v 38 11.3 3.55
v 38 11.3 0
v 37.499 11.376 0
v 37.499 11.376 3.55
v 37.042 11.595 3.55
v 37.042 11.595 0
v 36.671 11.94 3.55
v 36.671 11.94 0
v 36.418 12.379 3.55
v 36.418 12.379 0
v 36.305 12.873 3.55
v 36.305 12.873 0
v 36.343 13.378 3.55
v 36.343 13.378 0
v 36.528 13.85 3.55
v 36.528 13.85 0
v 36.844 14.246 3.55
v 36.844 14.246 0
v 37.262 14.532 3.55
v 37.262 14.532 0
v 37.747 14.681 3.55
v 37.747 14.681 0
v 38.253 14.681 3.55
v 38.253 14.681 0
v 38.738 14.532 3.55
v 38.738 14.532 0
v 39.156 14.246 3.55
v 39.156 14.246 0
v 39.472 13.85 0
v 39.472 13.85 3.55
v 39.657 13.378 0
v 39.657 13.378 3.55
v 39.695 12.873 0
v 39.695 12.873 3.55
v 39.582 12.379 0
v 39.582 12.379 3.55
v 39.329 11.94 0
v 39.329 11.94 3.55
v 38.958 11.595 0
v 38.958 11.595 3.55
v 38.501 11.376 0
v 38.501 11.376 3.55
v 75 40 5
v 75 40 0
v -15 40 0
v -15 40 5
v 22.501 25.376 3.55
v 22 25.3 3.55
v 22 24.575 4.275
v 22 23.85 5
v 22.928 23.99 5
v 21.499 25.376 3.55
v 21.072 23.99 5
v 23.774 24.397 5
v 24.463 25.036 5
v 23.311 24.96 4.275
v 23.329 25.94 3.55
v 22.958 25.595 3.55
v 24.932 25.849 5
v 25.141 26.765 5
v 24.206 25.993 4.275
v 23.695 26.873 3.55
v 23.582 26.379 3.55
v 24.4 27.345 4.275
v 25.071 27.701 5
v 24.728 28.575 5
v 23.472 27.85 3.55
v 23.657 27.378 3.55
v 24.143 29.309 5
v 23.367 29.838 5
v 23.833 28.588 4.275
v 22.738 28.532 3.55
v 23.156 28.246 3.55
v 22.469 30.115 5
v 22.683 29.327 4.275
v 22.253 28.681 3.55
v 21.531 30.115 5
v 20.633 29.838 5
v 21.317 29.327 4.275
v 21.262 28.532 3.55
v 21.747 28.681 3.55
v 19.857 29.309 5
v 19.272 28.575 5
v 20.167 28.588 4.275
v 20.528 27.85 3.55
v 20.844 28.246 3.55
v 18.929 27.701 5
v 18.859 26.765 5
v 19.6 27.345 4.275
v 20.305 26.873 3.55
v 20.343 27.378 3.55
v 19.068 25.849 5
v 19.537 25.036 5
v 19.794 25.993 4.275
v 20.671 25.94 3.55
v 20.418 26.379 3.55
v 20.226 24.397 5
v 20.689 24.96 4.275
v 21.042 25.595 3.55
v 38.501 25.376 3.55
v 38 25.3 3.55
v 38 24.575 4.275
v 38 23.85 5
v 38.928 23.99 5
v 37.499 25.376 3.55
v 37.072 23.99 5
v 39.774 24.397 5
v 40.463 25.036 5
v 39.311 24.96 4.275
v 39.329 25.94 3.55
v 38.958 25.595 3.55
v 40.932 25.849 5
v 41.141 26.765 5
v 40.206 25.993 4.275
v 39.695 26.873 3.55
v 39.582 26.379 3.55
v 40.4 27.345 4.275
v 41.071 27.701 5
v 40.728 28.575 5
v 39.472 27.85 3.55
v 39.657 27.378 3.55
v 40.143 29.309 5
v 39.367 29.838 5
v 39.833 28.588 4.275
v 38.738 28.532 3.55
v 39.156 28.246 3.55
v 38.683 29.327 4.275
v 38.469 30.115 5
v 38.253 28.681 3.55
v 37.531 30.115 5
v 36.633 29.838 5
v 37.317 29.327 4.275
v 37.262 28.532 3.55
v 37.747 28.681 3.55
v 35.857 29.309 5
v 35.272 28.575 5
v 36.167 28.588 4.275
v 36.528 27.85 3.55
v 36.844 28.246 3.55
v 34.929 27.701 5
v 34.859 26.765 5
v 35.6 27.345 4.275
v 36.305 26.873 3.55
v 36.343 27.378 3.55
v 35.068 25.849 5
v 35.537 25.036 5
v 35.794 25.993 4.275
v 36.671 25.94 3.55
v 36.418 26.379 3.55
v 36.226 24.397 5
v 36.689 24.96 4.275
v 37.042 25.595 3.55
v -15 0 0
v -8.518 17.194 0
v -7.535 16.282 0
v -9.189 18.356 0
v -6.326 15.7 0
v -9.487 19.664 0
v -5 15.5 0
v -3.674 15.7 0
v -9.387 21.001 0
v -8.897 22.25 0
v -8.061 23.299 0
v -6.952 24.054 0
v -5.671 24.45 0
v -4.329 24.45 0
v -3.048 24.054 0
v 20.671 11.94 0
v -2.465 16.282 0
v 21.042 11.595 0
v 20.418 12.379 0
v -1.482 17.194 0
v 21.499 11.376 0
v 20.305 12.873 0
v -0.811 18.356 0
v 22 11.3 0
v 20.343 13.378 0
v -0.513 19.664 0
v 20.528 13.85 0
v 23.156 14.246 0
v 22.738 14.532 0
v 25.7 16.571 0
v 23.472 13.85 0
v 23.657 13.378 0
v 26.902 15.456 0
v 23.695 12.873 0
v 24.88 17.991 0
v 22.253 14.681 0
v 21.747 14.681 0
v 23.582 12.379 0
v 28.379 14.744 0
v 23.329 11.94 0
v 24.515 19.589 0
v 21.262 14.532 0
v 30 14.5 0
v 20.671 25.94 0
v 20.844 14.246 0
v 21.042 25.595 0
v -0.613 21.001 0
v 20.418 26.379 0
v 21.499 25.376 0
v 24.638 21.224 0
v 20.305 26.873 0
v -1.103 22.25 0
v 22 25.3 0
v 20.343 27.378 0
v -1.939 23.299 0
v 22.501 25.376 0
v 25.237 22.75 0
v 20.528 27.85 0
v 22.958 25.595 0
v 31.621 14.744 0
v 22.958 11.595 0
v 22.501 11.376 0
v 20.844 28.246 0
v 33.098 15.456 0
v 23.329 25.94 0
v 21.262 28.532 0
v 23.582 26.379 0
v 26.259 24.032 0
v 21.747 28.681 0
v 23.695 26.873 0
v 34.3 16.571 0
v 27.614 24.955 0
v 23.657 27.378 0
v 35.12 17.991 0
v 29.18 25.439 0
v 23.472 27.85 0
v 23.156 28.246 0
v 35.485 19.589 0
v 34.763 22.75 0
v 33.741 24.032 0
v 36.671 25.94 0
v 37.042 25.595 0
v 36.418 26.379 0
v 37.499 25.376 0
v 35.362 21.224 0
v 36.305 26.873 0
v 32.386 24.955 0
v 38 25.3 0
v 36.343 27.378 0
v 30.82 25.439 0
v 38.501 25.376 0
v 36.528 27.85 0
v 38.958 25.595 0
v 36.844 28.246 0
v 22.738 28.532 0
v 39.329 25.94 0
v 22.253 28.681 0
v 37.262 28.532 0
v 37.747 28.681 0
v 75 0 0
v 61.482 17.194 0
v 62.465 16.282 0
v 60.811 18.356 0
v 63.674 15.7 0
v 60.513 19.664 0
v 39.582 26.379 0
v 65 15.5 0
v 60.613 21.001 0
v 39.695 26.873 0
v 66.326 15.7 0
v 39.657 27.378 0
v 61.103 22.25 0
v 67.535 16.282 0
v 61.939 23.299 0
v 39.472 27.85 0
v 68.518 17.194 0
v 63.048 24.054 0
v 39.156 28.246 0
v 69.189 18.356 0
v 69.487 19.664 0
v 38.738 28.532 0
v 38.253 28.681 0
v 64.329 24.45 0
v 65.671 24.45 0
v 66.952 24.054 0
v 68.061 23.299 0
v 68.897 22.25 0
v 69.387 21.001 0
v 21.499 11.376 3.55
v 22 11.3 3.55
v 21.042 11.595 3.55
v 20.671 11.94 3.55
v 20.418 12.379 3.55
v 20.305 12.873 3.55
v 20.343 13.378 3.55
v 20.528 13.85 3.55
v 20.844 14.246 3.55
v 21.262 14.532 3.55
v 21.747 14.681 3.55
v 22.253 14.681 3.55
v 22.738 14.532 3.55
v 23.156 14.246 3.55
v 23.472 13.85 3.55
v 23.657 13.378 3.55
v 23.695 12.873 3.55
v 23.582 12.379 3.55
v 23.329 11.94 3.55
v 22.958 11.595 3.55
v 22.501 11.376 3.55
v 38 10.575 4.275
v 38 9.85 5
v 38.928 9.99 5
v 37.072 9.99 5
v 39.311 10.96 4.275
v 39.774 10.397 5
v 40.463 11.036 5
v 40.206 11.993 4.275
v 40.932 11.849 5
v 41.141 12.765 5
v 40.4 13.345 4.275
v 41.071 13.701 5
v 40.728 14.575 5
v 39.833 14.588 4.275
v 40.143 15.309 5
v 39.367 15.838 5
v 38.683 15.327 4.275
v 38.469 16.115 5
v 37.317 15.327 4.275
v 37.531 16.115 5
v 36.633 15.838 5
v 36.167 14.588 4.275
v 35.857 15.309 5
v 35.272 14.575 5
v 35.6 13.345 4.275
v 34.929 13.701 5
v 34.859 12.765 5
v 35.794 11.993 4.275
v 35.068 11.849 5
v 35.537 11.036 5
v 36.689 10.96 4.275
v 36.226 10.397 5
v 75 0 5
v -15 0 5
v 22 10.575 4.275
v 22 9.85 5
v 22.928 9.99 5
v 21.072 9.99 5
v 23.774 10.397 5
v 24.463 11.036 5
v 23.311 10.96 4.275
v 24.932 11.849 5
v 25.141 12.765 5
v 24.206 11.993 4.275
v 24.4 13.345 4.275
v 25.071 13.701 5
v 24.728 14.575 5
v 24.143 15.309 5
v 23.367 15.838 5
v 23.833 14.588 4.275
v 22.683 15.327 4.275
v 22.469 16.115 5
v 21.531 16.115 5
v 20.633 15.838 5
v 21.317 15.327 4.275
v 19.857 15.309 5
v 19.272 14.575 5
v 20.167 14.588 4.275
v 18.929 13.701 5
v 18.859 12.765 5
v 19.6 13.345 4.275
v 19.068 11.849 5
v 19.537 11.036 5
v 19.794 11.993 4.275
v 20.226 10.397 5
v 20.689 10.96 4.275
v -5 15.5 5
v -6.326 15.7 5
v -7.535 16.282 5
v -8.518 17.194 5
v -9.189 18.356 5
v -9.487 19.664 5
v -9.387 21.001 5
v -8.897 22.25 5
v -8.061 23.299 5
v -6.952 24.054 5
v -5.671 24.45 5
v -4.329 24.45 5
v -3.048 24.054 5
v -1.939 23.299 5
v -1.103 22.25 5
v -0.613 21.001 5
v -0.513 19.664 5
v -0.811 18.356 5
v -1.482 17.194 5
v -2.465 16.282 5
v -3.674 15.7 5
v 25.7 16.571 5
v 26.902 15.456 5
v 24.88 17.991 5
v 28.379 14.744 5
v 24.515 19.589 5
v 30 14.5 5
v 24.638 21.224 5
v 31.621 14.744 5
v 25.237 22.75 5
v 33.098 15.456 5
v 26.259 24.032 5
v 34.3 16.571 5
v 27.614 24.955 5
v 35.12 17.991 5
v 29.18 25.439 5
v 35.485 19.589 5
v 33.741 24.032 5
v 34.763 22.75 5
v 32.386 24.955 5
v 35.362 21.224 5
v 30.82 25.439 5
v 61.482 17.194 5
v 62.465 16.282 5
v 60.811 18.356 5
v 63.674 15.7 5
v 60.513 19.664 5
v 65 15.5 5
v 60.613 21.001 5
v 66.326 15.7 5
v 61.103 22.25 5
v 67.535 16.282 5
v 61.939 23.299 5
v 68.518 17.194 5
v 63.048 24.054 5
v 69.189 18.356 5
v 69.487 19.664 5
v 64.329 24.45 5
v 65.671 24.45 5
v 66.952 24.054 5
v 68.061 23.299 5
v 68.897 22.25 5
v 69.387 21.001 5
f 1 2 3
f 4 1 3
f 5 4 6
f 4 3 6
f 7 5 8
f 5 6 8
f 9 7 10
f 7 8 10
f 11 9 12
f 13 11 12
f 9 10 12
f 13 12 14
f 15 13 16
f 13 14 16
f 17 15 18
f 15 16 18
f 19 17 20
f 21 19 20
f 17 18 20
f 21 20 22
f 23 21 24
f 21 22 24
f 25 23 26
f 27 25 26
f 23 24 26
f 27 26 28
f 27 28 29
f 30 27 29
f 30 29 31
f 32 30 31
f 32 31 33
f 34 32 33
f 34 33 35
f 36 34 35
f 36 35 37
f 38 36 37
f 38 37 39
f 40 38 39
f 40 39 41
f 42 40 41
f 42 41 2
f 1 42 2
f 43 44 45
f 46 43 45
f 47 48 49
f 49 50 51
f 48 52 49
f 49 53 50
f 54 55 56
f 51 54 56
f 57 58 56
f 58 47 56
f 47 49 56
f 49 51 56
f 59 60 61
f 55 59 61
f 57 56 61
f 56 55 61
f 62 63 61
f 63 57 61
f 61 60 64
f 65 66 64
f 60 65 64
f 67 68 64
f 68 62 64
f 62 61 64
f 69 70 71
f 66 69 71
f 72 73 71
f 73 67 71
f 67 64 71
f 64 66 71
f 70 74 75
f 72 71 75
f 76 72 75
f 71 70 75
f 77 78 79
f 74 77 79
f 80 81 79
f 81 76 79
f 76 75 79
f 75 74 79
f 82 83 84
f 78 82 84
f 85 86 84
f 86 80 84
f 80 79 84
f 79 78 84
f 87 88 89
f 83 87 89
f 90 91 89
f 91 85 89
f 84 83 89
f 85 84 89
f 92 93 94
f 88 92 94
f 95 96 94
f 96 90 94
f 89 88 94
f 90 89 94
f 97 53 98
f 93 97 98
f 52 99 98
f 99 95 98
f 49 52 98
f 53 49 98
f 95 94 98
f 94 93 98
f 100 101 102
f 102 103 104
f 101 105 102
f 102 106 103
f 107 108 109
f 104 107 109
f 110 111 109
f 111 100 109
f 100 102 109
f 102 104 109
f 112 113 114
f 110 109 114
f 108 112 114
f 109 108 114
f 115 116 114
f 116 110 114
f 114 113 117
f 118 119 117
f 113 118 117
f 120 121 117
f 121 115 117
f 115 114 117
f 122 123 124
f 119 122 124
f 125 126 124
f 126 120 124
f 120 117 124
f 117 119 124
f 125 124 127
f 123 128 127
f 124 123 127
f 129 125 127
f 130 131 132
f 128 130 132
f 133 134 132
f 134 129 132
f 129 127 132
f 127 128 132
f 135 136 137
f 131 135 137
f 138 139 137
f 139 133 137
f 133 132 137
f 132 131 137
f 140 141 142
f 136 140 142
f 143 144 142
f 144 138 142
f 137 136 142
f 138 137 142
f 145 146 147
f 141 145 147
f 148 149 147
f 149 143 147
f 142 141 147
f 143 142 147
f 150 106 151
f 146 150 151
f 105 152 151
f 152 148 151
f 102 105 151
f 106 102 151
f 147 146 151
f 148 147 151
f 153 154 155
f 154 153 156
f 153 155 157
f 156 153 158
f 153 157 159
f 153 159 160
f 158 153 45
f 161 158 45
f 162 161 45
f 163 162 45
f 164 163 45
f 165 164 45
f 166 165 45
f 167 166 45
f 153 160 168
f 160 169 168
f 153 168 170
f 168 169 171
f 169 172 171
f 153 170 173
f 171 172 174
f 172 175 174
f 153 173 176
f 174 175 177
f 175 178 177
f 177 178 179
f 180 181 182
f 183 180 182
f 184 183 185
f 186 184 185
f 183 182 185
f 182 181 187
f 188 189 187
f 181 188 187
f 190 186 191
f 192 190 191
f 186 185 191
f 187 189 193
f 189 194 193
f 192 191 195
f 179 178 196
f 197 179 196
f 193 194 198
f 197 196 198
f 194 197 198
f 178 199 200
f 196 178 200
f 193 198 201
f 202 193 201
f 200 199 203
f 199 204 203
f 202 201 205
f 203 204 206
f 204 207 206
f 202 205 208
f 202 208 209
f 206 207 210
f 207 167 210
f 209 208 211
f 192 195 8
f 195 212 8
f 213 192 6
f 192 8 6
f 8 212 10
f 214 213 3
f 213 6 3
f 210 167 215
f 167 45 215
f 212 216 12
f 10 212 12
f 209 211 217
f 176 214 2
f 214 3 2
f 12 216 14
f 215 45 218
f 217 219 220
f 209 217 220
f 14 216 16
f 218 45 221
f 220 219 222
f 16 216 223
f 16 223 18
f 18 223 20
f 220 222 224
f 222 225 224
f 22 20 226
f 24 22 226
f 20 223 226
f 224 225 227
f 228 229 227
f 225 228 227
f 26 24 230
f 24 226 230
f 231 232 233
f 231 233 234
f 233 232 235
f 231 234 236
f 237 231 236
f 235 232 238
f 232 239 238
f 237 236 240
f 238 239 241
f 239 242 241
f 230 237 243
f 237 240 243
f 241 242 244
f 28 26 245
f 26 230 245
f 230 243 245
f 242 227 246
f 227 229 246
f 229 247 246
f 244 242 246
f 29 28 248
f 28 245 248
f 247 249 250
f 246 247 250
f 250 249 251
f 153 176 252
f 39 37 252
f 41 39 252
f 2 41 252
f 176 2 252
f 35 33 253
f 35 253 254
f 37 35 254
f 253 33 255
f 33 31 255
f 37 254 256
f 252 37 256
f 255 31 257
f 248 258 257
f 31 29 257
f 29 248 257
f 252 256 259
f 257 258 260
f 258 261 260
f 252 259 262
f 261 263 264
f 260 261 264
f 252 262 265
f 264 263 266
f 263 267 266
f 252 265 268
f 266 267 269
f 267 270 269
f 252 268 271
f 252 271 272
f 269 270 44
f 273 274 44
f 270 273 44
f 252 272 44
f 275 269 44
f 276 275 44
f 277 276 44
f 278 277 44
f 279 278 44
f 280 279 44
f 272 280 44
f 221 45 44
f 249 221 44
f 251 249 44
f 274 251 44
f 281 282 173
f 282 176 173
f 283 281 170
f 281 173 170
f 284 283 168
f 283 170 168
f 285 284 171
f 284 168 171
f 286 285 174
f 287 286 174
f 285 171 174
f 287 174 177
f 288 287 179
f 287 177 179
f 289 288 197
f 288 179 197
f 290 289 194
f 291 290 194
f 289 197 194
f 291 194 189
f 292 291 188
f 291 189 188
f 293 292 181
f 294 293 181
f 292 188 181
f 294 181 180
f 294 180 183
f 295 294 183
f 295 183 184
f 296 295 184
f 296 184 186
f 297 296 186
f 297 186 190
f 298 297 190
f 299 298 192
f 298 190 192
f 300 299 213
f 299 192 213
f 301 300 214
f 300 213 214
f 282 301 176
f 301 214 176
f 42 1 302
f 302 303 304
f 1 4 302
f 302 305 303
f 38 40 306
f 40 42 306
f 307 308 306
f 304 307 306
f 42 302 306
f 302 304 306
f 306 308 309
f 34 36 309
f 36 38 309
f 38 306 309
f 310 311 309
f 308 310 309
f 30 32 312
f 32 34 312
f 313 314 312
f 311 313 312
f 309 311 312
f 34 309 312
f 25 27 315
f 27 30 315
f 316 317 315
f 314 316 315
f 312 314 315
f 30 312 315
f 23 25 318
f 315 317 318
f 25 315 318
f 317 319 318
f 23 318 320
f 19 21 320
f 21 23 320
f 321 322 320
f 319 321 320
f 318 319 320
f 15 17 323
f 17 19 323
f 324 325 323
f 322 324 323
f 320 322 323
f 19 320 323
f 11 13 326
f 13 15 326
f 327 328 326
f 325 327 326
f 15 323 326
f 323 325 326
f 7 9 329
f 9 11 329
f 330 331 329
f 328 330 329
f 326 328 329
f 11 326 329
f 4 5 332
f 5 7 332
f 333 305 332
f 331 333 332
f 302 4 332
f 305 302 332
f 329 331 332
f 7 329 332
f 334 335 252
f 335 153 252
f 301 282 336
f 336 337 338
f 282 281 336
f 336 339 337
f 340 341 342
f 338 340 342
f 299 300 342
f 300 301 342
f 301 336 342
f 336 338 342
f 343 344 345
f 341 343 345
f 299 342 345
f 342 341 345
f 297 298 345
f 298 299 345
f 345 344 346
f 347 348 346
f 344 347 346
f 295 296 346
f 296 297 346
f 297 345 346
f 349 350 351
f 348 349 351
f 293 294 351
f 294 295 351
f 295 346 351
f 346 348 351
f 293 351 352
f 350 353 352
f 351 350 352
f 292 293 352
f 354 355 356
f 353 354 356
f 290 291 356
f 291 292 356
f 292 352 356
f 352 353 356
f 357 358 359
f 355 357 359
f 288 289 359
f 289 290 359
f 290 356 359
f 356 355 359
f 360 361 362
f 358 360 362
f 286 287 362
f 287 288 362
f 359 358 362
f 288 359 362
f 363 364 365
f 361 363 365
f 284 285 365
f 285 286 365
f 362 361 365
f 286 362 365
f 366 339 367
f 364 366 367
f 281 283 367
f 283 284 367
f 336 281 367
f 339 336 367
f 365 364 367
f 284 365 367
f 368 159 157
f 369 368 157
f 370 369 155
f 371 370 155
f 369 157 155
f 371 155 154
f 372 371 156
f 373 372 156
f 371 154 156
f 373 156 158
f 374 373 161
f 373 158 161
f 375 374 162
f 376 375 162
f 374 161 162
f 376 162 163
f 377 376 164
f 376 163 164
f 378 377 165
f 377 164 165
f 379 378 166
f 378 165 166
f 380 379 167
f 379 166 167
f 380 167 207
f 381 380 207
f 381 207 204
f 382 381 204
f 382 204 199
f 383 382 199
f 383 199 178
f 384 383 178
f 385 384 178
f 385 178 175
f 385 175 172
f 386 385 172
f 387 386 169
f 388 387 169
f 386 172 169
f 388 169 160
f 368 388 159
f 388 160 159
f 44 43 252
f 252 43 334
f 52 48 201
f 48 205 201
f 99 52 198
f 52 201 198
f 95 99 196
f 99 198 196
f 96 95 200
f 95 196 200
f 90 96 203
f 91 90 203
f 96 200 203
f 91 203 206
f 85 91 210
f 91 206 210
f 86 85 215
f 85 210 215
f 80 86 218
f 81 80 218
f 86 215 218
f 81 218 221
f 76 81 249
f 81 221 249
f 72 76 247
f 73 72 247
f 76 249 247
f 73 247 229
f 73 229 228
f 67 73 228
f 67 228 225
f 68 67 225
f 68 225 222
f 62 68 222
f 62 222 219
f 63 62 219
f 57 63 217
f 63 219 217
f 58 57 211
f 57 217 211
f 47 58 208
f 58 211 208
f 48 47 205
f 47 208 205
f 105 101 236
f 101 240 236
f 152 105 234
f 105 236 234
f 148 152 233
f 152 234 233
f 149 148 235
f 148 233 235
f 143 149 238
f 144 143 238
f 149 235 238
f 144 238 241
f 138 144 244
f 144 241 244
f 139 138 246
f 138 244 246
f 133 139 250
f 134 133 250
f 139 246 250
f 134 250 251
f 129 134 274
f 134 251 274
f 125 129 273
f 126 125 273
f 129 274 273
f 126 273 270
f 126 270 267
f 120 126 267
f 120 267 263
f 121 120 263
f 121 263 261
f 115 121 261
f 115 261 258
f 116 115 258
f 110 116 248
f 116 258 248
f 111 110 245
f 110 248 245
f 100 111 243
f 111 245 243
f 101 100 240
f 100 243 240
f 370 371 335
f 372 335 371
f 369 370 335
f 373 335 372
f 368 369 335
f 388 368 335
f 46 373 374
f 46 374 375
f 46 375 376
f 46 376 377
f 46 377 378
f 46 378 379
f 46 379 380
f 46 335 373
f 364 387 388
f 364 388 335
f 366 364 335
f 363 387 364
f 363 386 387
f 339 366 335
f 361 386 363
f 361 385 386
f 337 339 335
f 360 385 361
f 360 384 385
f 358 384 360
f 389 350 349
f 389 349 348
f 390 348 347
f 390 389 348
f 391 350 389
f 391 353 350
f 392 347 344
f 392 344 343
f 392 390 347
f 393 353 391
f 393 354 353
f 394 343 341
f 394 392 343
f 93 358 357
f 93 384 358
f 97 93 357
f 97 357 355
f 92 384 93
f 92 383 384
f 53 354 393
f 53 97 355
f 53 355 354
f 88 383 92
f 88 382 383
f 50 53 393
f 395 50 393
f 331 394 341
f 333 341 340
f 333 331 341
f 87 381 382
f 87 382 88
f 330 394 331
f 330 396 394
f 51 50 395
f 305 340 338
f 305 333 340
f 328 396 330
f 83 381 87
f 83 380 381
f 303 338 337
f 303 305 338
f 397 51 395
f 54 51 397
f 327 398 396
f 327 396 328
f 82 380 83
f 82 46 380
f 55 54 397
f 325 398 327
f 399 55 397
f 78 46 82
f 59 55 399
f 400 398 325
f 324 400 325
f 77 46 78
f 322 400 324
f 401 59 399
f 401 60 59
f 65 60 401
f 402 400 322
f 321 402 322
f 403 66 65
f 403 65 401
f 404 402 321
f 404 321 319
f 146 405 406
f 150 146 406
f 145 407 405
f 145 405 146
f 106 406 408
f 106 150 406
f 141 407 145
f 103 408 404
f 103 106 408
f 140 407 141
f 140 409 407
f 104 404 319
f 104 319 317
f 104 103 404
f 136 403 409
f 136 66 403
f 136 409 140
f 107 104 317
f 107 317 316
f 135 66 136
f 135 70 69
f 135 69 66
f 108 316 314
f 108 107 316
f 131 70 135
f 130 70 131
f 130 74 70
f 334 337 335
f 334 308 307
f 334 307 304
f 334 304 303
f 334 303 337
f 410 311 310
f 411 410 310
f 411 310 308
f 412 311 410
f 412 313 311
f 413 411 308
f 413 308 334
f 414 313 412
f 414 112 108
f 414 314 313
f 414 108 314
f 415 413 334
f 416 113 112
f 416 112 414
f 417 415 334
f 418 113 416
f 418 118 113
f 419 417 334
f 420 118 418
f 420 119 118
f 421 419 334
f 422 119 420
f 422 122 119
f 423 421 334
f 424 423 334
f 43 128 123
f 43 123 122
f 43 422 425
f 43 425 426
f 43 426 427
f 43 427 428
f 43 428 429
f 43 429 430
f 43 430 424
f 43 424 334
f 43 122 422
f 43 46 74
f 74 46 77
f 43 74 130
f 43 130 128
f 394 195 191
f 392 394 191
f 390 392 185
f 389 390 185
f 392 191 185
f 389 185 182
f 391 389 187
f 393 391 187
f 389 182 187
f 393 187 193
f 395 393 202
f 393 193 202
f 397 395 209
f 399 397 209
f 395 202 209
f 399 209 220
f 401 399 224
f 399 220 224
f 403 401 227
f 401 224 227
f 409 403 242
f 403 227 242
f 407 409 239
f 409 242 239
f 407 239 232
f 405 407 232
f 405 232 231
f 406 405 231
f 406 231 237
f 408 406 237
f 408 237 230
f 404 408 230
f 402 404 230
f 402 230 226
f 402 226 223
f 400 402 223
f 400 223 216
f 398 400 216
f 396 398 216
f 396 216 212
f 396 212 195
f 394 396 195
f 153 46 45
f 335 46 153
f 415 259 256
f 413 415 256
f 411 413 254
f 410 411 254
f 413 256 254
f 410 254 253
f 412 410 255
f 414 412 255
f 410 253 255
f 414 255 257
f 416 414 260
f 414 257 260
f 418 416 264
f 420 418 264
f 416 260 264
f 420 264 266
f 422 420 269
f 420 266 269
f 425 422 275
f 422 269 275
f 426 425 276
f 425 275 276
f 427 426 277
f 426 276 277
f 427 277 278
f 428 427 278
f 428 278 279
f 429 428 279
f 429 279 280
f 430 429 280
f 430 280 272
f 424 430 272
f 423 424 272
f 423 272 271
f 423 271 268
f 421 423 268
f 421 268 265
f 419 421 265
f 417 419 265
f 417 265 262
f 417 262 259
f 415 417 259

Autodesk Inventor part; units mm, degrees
ref_plane "YZ Plane" through (0, 0, 0) normal (1, 0, 0) x (0, 1, 0)
ref_plane "XZ Plane" through (0, 0, 0) normal (0, 1, 0) x (-1, 0, 0)
ref_plane "XY Plane" through (0, 0, 0) normal (0, 0, 1) x (1, 0, 0)
sketch "Sketch1" plane through (0, 0, 0) normal (0, 0, 1) x (1, 0, 0)
  line L0 (0, 0) -> (60, 0)
  line L1 (60, 0) -> (60, 40)
  line L2 (60, 40) -> (0, 40)
  line L3 (0, 40) -> (0, 0)
  dimension "d0" = 60
  dimension "d1" = 40
extrude "Extrusion1" add sketch "Sketch1" along normal blind 5
sketch "Sketch6" plane through (0, 0, 5) normal (0, 0, 1) x (1, 0, 0)
  point P0 (0, 0)
  point P1 (30, 20)
hole "Hole2" at (30, 20, 5) direction (0, 0, -1) diameter 11 end through all clearance for "Countersunk Flat Head Screw ISO 2009/7046" size "M10" standard "ISO"
sketch "Sketch7" plane through (0, 0, 5) normal (0, 0, 1) x (1, 0, 0)
  line L0 (0, 40) -> (0, 0) projected
  line L1 (60, 0) -> (60, 40) projected
  line L2 (60, 0) -> (0, 0)
  line L3 (60, 40) -> (0, 40) projected
  line L4 (30, 40) -> (30, 0)
  line L5 (0, 0) -> (60, 0) projected
  line L6 (0, 40) -> (0, 0) projected
  line L7 (0, 40) -> (-15, 40)
  line L8 (-15, 40) -> (-15, 0)
  line L9 (-15, 0) -> (0, 0)
  line L10 (0, 0) -> (0, 40)
  line L11 (60, 40) -> (60, 0)
  line L12 (60, 40) -> (60, 0)
  line L13 (60, 40) -> (75, 40)
  line L14 (75, 40) -> (75, 0)
  line L15 (75, 0) -> (60, 0)
  line L16 (0, 40) -> (-15, 40)
  point P0 (60, 0)
  point P1 (0, 0)
  dimension "d54" = 15
  dimension "d55" = 40
extrude "Extrusion3" add sketch "Sketch7" against normal blind 5 contours L0 L9 L8 L7 | L13 L14 L15 L1
sketch "Sketch9" plane through (0, 0, 5) normal (0, 0, 1) x (1, 0, 0)
  point P0 (0, 0)
  point P1 (-5, 20)
  point P2 (65, 20)
hole "Hole4" at (-5, 20, 5) at (65, 20, 5) direction (0, 0, -1) diameter 9 end through all clearance for "Countersunk Flat Head Screw ISO 2009/7046" size "M8" standard "ISO"
sketch "Sketch10" plane through (0, 0, 5) normal (0, 0, 1) x (1, 0, 0)
  line L0 (35.5, 14.5) -> (35.5, 25.5)
  line L1 (35.5, 14.5) -> (35.5, 25.5)
  line L2 (24.5, 25.5) -> (24.5, 14.5)
  line L3 (24.5, 25.5) -> (24.5, 14.5)
  line L4 (24.5, 14.5) -> (35.5, 25.5) construction
  line L5 (35.5, 14.5) -> (24.5, 25.5) construction
  circle A0 centre (30, 20) radius 5.5 projected
  line L6 (24.5, 30) -> (24.5, 10)
  line L7 (24.5, 10) -> (19.5, 10)
  line L8 (19.5, 10) -> (19.5, 30)
  line L9 (19.5, 30) -> (24.5, 30)
  line L10 (24.5, 20) -> (35.5, 20)
  line L11 (35.5, 30) -> (35.5, 10)
  line L12 (35.5, 10) -> (40.5, 10)
  line L13 (40.5, 10) -> (40.5, 30)
  line L14 (40.5, 30) -> (35.5, 30)
  point P0 (0, 0)
  point P1 (30, 25.5)
  point P2 (22, 13)
  point P3 (22, 27)
  point P4 (38, 13)
  point P5 (38, 27)
  dimension "d45" = 20
  dimension "d46" = 5
hole "Hole5" at (22, 13, 5) at (22, 27, 5) at (38, 13, 5) at (38, 27, 5) direction (0, 0, -1) diameter 3.4 end through all countersink diameter 6.3 countersink angle 90 clearance for "Countersunk Flat Head Screw ISO 2009/7046" size "M3" standard "ISO"
properties part number "Al block2"
